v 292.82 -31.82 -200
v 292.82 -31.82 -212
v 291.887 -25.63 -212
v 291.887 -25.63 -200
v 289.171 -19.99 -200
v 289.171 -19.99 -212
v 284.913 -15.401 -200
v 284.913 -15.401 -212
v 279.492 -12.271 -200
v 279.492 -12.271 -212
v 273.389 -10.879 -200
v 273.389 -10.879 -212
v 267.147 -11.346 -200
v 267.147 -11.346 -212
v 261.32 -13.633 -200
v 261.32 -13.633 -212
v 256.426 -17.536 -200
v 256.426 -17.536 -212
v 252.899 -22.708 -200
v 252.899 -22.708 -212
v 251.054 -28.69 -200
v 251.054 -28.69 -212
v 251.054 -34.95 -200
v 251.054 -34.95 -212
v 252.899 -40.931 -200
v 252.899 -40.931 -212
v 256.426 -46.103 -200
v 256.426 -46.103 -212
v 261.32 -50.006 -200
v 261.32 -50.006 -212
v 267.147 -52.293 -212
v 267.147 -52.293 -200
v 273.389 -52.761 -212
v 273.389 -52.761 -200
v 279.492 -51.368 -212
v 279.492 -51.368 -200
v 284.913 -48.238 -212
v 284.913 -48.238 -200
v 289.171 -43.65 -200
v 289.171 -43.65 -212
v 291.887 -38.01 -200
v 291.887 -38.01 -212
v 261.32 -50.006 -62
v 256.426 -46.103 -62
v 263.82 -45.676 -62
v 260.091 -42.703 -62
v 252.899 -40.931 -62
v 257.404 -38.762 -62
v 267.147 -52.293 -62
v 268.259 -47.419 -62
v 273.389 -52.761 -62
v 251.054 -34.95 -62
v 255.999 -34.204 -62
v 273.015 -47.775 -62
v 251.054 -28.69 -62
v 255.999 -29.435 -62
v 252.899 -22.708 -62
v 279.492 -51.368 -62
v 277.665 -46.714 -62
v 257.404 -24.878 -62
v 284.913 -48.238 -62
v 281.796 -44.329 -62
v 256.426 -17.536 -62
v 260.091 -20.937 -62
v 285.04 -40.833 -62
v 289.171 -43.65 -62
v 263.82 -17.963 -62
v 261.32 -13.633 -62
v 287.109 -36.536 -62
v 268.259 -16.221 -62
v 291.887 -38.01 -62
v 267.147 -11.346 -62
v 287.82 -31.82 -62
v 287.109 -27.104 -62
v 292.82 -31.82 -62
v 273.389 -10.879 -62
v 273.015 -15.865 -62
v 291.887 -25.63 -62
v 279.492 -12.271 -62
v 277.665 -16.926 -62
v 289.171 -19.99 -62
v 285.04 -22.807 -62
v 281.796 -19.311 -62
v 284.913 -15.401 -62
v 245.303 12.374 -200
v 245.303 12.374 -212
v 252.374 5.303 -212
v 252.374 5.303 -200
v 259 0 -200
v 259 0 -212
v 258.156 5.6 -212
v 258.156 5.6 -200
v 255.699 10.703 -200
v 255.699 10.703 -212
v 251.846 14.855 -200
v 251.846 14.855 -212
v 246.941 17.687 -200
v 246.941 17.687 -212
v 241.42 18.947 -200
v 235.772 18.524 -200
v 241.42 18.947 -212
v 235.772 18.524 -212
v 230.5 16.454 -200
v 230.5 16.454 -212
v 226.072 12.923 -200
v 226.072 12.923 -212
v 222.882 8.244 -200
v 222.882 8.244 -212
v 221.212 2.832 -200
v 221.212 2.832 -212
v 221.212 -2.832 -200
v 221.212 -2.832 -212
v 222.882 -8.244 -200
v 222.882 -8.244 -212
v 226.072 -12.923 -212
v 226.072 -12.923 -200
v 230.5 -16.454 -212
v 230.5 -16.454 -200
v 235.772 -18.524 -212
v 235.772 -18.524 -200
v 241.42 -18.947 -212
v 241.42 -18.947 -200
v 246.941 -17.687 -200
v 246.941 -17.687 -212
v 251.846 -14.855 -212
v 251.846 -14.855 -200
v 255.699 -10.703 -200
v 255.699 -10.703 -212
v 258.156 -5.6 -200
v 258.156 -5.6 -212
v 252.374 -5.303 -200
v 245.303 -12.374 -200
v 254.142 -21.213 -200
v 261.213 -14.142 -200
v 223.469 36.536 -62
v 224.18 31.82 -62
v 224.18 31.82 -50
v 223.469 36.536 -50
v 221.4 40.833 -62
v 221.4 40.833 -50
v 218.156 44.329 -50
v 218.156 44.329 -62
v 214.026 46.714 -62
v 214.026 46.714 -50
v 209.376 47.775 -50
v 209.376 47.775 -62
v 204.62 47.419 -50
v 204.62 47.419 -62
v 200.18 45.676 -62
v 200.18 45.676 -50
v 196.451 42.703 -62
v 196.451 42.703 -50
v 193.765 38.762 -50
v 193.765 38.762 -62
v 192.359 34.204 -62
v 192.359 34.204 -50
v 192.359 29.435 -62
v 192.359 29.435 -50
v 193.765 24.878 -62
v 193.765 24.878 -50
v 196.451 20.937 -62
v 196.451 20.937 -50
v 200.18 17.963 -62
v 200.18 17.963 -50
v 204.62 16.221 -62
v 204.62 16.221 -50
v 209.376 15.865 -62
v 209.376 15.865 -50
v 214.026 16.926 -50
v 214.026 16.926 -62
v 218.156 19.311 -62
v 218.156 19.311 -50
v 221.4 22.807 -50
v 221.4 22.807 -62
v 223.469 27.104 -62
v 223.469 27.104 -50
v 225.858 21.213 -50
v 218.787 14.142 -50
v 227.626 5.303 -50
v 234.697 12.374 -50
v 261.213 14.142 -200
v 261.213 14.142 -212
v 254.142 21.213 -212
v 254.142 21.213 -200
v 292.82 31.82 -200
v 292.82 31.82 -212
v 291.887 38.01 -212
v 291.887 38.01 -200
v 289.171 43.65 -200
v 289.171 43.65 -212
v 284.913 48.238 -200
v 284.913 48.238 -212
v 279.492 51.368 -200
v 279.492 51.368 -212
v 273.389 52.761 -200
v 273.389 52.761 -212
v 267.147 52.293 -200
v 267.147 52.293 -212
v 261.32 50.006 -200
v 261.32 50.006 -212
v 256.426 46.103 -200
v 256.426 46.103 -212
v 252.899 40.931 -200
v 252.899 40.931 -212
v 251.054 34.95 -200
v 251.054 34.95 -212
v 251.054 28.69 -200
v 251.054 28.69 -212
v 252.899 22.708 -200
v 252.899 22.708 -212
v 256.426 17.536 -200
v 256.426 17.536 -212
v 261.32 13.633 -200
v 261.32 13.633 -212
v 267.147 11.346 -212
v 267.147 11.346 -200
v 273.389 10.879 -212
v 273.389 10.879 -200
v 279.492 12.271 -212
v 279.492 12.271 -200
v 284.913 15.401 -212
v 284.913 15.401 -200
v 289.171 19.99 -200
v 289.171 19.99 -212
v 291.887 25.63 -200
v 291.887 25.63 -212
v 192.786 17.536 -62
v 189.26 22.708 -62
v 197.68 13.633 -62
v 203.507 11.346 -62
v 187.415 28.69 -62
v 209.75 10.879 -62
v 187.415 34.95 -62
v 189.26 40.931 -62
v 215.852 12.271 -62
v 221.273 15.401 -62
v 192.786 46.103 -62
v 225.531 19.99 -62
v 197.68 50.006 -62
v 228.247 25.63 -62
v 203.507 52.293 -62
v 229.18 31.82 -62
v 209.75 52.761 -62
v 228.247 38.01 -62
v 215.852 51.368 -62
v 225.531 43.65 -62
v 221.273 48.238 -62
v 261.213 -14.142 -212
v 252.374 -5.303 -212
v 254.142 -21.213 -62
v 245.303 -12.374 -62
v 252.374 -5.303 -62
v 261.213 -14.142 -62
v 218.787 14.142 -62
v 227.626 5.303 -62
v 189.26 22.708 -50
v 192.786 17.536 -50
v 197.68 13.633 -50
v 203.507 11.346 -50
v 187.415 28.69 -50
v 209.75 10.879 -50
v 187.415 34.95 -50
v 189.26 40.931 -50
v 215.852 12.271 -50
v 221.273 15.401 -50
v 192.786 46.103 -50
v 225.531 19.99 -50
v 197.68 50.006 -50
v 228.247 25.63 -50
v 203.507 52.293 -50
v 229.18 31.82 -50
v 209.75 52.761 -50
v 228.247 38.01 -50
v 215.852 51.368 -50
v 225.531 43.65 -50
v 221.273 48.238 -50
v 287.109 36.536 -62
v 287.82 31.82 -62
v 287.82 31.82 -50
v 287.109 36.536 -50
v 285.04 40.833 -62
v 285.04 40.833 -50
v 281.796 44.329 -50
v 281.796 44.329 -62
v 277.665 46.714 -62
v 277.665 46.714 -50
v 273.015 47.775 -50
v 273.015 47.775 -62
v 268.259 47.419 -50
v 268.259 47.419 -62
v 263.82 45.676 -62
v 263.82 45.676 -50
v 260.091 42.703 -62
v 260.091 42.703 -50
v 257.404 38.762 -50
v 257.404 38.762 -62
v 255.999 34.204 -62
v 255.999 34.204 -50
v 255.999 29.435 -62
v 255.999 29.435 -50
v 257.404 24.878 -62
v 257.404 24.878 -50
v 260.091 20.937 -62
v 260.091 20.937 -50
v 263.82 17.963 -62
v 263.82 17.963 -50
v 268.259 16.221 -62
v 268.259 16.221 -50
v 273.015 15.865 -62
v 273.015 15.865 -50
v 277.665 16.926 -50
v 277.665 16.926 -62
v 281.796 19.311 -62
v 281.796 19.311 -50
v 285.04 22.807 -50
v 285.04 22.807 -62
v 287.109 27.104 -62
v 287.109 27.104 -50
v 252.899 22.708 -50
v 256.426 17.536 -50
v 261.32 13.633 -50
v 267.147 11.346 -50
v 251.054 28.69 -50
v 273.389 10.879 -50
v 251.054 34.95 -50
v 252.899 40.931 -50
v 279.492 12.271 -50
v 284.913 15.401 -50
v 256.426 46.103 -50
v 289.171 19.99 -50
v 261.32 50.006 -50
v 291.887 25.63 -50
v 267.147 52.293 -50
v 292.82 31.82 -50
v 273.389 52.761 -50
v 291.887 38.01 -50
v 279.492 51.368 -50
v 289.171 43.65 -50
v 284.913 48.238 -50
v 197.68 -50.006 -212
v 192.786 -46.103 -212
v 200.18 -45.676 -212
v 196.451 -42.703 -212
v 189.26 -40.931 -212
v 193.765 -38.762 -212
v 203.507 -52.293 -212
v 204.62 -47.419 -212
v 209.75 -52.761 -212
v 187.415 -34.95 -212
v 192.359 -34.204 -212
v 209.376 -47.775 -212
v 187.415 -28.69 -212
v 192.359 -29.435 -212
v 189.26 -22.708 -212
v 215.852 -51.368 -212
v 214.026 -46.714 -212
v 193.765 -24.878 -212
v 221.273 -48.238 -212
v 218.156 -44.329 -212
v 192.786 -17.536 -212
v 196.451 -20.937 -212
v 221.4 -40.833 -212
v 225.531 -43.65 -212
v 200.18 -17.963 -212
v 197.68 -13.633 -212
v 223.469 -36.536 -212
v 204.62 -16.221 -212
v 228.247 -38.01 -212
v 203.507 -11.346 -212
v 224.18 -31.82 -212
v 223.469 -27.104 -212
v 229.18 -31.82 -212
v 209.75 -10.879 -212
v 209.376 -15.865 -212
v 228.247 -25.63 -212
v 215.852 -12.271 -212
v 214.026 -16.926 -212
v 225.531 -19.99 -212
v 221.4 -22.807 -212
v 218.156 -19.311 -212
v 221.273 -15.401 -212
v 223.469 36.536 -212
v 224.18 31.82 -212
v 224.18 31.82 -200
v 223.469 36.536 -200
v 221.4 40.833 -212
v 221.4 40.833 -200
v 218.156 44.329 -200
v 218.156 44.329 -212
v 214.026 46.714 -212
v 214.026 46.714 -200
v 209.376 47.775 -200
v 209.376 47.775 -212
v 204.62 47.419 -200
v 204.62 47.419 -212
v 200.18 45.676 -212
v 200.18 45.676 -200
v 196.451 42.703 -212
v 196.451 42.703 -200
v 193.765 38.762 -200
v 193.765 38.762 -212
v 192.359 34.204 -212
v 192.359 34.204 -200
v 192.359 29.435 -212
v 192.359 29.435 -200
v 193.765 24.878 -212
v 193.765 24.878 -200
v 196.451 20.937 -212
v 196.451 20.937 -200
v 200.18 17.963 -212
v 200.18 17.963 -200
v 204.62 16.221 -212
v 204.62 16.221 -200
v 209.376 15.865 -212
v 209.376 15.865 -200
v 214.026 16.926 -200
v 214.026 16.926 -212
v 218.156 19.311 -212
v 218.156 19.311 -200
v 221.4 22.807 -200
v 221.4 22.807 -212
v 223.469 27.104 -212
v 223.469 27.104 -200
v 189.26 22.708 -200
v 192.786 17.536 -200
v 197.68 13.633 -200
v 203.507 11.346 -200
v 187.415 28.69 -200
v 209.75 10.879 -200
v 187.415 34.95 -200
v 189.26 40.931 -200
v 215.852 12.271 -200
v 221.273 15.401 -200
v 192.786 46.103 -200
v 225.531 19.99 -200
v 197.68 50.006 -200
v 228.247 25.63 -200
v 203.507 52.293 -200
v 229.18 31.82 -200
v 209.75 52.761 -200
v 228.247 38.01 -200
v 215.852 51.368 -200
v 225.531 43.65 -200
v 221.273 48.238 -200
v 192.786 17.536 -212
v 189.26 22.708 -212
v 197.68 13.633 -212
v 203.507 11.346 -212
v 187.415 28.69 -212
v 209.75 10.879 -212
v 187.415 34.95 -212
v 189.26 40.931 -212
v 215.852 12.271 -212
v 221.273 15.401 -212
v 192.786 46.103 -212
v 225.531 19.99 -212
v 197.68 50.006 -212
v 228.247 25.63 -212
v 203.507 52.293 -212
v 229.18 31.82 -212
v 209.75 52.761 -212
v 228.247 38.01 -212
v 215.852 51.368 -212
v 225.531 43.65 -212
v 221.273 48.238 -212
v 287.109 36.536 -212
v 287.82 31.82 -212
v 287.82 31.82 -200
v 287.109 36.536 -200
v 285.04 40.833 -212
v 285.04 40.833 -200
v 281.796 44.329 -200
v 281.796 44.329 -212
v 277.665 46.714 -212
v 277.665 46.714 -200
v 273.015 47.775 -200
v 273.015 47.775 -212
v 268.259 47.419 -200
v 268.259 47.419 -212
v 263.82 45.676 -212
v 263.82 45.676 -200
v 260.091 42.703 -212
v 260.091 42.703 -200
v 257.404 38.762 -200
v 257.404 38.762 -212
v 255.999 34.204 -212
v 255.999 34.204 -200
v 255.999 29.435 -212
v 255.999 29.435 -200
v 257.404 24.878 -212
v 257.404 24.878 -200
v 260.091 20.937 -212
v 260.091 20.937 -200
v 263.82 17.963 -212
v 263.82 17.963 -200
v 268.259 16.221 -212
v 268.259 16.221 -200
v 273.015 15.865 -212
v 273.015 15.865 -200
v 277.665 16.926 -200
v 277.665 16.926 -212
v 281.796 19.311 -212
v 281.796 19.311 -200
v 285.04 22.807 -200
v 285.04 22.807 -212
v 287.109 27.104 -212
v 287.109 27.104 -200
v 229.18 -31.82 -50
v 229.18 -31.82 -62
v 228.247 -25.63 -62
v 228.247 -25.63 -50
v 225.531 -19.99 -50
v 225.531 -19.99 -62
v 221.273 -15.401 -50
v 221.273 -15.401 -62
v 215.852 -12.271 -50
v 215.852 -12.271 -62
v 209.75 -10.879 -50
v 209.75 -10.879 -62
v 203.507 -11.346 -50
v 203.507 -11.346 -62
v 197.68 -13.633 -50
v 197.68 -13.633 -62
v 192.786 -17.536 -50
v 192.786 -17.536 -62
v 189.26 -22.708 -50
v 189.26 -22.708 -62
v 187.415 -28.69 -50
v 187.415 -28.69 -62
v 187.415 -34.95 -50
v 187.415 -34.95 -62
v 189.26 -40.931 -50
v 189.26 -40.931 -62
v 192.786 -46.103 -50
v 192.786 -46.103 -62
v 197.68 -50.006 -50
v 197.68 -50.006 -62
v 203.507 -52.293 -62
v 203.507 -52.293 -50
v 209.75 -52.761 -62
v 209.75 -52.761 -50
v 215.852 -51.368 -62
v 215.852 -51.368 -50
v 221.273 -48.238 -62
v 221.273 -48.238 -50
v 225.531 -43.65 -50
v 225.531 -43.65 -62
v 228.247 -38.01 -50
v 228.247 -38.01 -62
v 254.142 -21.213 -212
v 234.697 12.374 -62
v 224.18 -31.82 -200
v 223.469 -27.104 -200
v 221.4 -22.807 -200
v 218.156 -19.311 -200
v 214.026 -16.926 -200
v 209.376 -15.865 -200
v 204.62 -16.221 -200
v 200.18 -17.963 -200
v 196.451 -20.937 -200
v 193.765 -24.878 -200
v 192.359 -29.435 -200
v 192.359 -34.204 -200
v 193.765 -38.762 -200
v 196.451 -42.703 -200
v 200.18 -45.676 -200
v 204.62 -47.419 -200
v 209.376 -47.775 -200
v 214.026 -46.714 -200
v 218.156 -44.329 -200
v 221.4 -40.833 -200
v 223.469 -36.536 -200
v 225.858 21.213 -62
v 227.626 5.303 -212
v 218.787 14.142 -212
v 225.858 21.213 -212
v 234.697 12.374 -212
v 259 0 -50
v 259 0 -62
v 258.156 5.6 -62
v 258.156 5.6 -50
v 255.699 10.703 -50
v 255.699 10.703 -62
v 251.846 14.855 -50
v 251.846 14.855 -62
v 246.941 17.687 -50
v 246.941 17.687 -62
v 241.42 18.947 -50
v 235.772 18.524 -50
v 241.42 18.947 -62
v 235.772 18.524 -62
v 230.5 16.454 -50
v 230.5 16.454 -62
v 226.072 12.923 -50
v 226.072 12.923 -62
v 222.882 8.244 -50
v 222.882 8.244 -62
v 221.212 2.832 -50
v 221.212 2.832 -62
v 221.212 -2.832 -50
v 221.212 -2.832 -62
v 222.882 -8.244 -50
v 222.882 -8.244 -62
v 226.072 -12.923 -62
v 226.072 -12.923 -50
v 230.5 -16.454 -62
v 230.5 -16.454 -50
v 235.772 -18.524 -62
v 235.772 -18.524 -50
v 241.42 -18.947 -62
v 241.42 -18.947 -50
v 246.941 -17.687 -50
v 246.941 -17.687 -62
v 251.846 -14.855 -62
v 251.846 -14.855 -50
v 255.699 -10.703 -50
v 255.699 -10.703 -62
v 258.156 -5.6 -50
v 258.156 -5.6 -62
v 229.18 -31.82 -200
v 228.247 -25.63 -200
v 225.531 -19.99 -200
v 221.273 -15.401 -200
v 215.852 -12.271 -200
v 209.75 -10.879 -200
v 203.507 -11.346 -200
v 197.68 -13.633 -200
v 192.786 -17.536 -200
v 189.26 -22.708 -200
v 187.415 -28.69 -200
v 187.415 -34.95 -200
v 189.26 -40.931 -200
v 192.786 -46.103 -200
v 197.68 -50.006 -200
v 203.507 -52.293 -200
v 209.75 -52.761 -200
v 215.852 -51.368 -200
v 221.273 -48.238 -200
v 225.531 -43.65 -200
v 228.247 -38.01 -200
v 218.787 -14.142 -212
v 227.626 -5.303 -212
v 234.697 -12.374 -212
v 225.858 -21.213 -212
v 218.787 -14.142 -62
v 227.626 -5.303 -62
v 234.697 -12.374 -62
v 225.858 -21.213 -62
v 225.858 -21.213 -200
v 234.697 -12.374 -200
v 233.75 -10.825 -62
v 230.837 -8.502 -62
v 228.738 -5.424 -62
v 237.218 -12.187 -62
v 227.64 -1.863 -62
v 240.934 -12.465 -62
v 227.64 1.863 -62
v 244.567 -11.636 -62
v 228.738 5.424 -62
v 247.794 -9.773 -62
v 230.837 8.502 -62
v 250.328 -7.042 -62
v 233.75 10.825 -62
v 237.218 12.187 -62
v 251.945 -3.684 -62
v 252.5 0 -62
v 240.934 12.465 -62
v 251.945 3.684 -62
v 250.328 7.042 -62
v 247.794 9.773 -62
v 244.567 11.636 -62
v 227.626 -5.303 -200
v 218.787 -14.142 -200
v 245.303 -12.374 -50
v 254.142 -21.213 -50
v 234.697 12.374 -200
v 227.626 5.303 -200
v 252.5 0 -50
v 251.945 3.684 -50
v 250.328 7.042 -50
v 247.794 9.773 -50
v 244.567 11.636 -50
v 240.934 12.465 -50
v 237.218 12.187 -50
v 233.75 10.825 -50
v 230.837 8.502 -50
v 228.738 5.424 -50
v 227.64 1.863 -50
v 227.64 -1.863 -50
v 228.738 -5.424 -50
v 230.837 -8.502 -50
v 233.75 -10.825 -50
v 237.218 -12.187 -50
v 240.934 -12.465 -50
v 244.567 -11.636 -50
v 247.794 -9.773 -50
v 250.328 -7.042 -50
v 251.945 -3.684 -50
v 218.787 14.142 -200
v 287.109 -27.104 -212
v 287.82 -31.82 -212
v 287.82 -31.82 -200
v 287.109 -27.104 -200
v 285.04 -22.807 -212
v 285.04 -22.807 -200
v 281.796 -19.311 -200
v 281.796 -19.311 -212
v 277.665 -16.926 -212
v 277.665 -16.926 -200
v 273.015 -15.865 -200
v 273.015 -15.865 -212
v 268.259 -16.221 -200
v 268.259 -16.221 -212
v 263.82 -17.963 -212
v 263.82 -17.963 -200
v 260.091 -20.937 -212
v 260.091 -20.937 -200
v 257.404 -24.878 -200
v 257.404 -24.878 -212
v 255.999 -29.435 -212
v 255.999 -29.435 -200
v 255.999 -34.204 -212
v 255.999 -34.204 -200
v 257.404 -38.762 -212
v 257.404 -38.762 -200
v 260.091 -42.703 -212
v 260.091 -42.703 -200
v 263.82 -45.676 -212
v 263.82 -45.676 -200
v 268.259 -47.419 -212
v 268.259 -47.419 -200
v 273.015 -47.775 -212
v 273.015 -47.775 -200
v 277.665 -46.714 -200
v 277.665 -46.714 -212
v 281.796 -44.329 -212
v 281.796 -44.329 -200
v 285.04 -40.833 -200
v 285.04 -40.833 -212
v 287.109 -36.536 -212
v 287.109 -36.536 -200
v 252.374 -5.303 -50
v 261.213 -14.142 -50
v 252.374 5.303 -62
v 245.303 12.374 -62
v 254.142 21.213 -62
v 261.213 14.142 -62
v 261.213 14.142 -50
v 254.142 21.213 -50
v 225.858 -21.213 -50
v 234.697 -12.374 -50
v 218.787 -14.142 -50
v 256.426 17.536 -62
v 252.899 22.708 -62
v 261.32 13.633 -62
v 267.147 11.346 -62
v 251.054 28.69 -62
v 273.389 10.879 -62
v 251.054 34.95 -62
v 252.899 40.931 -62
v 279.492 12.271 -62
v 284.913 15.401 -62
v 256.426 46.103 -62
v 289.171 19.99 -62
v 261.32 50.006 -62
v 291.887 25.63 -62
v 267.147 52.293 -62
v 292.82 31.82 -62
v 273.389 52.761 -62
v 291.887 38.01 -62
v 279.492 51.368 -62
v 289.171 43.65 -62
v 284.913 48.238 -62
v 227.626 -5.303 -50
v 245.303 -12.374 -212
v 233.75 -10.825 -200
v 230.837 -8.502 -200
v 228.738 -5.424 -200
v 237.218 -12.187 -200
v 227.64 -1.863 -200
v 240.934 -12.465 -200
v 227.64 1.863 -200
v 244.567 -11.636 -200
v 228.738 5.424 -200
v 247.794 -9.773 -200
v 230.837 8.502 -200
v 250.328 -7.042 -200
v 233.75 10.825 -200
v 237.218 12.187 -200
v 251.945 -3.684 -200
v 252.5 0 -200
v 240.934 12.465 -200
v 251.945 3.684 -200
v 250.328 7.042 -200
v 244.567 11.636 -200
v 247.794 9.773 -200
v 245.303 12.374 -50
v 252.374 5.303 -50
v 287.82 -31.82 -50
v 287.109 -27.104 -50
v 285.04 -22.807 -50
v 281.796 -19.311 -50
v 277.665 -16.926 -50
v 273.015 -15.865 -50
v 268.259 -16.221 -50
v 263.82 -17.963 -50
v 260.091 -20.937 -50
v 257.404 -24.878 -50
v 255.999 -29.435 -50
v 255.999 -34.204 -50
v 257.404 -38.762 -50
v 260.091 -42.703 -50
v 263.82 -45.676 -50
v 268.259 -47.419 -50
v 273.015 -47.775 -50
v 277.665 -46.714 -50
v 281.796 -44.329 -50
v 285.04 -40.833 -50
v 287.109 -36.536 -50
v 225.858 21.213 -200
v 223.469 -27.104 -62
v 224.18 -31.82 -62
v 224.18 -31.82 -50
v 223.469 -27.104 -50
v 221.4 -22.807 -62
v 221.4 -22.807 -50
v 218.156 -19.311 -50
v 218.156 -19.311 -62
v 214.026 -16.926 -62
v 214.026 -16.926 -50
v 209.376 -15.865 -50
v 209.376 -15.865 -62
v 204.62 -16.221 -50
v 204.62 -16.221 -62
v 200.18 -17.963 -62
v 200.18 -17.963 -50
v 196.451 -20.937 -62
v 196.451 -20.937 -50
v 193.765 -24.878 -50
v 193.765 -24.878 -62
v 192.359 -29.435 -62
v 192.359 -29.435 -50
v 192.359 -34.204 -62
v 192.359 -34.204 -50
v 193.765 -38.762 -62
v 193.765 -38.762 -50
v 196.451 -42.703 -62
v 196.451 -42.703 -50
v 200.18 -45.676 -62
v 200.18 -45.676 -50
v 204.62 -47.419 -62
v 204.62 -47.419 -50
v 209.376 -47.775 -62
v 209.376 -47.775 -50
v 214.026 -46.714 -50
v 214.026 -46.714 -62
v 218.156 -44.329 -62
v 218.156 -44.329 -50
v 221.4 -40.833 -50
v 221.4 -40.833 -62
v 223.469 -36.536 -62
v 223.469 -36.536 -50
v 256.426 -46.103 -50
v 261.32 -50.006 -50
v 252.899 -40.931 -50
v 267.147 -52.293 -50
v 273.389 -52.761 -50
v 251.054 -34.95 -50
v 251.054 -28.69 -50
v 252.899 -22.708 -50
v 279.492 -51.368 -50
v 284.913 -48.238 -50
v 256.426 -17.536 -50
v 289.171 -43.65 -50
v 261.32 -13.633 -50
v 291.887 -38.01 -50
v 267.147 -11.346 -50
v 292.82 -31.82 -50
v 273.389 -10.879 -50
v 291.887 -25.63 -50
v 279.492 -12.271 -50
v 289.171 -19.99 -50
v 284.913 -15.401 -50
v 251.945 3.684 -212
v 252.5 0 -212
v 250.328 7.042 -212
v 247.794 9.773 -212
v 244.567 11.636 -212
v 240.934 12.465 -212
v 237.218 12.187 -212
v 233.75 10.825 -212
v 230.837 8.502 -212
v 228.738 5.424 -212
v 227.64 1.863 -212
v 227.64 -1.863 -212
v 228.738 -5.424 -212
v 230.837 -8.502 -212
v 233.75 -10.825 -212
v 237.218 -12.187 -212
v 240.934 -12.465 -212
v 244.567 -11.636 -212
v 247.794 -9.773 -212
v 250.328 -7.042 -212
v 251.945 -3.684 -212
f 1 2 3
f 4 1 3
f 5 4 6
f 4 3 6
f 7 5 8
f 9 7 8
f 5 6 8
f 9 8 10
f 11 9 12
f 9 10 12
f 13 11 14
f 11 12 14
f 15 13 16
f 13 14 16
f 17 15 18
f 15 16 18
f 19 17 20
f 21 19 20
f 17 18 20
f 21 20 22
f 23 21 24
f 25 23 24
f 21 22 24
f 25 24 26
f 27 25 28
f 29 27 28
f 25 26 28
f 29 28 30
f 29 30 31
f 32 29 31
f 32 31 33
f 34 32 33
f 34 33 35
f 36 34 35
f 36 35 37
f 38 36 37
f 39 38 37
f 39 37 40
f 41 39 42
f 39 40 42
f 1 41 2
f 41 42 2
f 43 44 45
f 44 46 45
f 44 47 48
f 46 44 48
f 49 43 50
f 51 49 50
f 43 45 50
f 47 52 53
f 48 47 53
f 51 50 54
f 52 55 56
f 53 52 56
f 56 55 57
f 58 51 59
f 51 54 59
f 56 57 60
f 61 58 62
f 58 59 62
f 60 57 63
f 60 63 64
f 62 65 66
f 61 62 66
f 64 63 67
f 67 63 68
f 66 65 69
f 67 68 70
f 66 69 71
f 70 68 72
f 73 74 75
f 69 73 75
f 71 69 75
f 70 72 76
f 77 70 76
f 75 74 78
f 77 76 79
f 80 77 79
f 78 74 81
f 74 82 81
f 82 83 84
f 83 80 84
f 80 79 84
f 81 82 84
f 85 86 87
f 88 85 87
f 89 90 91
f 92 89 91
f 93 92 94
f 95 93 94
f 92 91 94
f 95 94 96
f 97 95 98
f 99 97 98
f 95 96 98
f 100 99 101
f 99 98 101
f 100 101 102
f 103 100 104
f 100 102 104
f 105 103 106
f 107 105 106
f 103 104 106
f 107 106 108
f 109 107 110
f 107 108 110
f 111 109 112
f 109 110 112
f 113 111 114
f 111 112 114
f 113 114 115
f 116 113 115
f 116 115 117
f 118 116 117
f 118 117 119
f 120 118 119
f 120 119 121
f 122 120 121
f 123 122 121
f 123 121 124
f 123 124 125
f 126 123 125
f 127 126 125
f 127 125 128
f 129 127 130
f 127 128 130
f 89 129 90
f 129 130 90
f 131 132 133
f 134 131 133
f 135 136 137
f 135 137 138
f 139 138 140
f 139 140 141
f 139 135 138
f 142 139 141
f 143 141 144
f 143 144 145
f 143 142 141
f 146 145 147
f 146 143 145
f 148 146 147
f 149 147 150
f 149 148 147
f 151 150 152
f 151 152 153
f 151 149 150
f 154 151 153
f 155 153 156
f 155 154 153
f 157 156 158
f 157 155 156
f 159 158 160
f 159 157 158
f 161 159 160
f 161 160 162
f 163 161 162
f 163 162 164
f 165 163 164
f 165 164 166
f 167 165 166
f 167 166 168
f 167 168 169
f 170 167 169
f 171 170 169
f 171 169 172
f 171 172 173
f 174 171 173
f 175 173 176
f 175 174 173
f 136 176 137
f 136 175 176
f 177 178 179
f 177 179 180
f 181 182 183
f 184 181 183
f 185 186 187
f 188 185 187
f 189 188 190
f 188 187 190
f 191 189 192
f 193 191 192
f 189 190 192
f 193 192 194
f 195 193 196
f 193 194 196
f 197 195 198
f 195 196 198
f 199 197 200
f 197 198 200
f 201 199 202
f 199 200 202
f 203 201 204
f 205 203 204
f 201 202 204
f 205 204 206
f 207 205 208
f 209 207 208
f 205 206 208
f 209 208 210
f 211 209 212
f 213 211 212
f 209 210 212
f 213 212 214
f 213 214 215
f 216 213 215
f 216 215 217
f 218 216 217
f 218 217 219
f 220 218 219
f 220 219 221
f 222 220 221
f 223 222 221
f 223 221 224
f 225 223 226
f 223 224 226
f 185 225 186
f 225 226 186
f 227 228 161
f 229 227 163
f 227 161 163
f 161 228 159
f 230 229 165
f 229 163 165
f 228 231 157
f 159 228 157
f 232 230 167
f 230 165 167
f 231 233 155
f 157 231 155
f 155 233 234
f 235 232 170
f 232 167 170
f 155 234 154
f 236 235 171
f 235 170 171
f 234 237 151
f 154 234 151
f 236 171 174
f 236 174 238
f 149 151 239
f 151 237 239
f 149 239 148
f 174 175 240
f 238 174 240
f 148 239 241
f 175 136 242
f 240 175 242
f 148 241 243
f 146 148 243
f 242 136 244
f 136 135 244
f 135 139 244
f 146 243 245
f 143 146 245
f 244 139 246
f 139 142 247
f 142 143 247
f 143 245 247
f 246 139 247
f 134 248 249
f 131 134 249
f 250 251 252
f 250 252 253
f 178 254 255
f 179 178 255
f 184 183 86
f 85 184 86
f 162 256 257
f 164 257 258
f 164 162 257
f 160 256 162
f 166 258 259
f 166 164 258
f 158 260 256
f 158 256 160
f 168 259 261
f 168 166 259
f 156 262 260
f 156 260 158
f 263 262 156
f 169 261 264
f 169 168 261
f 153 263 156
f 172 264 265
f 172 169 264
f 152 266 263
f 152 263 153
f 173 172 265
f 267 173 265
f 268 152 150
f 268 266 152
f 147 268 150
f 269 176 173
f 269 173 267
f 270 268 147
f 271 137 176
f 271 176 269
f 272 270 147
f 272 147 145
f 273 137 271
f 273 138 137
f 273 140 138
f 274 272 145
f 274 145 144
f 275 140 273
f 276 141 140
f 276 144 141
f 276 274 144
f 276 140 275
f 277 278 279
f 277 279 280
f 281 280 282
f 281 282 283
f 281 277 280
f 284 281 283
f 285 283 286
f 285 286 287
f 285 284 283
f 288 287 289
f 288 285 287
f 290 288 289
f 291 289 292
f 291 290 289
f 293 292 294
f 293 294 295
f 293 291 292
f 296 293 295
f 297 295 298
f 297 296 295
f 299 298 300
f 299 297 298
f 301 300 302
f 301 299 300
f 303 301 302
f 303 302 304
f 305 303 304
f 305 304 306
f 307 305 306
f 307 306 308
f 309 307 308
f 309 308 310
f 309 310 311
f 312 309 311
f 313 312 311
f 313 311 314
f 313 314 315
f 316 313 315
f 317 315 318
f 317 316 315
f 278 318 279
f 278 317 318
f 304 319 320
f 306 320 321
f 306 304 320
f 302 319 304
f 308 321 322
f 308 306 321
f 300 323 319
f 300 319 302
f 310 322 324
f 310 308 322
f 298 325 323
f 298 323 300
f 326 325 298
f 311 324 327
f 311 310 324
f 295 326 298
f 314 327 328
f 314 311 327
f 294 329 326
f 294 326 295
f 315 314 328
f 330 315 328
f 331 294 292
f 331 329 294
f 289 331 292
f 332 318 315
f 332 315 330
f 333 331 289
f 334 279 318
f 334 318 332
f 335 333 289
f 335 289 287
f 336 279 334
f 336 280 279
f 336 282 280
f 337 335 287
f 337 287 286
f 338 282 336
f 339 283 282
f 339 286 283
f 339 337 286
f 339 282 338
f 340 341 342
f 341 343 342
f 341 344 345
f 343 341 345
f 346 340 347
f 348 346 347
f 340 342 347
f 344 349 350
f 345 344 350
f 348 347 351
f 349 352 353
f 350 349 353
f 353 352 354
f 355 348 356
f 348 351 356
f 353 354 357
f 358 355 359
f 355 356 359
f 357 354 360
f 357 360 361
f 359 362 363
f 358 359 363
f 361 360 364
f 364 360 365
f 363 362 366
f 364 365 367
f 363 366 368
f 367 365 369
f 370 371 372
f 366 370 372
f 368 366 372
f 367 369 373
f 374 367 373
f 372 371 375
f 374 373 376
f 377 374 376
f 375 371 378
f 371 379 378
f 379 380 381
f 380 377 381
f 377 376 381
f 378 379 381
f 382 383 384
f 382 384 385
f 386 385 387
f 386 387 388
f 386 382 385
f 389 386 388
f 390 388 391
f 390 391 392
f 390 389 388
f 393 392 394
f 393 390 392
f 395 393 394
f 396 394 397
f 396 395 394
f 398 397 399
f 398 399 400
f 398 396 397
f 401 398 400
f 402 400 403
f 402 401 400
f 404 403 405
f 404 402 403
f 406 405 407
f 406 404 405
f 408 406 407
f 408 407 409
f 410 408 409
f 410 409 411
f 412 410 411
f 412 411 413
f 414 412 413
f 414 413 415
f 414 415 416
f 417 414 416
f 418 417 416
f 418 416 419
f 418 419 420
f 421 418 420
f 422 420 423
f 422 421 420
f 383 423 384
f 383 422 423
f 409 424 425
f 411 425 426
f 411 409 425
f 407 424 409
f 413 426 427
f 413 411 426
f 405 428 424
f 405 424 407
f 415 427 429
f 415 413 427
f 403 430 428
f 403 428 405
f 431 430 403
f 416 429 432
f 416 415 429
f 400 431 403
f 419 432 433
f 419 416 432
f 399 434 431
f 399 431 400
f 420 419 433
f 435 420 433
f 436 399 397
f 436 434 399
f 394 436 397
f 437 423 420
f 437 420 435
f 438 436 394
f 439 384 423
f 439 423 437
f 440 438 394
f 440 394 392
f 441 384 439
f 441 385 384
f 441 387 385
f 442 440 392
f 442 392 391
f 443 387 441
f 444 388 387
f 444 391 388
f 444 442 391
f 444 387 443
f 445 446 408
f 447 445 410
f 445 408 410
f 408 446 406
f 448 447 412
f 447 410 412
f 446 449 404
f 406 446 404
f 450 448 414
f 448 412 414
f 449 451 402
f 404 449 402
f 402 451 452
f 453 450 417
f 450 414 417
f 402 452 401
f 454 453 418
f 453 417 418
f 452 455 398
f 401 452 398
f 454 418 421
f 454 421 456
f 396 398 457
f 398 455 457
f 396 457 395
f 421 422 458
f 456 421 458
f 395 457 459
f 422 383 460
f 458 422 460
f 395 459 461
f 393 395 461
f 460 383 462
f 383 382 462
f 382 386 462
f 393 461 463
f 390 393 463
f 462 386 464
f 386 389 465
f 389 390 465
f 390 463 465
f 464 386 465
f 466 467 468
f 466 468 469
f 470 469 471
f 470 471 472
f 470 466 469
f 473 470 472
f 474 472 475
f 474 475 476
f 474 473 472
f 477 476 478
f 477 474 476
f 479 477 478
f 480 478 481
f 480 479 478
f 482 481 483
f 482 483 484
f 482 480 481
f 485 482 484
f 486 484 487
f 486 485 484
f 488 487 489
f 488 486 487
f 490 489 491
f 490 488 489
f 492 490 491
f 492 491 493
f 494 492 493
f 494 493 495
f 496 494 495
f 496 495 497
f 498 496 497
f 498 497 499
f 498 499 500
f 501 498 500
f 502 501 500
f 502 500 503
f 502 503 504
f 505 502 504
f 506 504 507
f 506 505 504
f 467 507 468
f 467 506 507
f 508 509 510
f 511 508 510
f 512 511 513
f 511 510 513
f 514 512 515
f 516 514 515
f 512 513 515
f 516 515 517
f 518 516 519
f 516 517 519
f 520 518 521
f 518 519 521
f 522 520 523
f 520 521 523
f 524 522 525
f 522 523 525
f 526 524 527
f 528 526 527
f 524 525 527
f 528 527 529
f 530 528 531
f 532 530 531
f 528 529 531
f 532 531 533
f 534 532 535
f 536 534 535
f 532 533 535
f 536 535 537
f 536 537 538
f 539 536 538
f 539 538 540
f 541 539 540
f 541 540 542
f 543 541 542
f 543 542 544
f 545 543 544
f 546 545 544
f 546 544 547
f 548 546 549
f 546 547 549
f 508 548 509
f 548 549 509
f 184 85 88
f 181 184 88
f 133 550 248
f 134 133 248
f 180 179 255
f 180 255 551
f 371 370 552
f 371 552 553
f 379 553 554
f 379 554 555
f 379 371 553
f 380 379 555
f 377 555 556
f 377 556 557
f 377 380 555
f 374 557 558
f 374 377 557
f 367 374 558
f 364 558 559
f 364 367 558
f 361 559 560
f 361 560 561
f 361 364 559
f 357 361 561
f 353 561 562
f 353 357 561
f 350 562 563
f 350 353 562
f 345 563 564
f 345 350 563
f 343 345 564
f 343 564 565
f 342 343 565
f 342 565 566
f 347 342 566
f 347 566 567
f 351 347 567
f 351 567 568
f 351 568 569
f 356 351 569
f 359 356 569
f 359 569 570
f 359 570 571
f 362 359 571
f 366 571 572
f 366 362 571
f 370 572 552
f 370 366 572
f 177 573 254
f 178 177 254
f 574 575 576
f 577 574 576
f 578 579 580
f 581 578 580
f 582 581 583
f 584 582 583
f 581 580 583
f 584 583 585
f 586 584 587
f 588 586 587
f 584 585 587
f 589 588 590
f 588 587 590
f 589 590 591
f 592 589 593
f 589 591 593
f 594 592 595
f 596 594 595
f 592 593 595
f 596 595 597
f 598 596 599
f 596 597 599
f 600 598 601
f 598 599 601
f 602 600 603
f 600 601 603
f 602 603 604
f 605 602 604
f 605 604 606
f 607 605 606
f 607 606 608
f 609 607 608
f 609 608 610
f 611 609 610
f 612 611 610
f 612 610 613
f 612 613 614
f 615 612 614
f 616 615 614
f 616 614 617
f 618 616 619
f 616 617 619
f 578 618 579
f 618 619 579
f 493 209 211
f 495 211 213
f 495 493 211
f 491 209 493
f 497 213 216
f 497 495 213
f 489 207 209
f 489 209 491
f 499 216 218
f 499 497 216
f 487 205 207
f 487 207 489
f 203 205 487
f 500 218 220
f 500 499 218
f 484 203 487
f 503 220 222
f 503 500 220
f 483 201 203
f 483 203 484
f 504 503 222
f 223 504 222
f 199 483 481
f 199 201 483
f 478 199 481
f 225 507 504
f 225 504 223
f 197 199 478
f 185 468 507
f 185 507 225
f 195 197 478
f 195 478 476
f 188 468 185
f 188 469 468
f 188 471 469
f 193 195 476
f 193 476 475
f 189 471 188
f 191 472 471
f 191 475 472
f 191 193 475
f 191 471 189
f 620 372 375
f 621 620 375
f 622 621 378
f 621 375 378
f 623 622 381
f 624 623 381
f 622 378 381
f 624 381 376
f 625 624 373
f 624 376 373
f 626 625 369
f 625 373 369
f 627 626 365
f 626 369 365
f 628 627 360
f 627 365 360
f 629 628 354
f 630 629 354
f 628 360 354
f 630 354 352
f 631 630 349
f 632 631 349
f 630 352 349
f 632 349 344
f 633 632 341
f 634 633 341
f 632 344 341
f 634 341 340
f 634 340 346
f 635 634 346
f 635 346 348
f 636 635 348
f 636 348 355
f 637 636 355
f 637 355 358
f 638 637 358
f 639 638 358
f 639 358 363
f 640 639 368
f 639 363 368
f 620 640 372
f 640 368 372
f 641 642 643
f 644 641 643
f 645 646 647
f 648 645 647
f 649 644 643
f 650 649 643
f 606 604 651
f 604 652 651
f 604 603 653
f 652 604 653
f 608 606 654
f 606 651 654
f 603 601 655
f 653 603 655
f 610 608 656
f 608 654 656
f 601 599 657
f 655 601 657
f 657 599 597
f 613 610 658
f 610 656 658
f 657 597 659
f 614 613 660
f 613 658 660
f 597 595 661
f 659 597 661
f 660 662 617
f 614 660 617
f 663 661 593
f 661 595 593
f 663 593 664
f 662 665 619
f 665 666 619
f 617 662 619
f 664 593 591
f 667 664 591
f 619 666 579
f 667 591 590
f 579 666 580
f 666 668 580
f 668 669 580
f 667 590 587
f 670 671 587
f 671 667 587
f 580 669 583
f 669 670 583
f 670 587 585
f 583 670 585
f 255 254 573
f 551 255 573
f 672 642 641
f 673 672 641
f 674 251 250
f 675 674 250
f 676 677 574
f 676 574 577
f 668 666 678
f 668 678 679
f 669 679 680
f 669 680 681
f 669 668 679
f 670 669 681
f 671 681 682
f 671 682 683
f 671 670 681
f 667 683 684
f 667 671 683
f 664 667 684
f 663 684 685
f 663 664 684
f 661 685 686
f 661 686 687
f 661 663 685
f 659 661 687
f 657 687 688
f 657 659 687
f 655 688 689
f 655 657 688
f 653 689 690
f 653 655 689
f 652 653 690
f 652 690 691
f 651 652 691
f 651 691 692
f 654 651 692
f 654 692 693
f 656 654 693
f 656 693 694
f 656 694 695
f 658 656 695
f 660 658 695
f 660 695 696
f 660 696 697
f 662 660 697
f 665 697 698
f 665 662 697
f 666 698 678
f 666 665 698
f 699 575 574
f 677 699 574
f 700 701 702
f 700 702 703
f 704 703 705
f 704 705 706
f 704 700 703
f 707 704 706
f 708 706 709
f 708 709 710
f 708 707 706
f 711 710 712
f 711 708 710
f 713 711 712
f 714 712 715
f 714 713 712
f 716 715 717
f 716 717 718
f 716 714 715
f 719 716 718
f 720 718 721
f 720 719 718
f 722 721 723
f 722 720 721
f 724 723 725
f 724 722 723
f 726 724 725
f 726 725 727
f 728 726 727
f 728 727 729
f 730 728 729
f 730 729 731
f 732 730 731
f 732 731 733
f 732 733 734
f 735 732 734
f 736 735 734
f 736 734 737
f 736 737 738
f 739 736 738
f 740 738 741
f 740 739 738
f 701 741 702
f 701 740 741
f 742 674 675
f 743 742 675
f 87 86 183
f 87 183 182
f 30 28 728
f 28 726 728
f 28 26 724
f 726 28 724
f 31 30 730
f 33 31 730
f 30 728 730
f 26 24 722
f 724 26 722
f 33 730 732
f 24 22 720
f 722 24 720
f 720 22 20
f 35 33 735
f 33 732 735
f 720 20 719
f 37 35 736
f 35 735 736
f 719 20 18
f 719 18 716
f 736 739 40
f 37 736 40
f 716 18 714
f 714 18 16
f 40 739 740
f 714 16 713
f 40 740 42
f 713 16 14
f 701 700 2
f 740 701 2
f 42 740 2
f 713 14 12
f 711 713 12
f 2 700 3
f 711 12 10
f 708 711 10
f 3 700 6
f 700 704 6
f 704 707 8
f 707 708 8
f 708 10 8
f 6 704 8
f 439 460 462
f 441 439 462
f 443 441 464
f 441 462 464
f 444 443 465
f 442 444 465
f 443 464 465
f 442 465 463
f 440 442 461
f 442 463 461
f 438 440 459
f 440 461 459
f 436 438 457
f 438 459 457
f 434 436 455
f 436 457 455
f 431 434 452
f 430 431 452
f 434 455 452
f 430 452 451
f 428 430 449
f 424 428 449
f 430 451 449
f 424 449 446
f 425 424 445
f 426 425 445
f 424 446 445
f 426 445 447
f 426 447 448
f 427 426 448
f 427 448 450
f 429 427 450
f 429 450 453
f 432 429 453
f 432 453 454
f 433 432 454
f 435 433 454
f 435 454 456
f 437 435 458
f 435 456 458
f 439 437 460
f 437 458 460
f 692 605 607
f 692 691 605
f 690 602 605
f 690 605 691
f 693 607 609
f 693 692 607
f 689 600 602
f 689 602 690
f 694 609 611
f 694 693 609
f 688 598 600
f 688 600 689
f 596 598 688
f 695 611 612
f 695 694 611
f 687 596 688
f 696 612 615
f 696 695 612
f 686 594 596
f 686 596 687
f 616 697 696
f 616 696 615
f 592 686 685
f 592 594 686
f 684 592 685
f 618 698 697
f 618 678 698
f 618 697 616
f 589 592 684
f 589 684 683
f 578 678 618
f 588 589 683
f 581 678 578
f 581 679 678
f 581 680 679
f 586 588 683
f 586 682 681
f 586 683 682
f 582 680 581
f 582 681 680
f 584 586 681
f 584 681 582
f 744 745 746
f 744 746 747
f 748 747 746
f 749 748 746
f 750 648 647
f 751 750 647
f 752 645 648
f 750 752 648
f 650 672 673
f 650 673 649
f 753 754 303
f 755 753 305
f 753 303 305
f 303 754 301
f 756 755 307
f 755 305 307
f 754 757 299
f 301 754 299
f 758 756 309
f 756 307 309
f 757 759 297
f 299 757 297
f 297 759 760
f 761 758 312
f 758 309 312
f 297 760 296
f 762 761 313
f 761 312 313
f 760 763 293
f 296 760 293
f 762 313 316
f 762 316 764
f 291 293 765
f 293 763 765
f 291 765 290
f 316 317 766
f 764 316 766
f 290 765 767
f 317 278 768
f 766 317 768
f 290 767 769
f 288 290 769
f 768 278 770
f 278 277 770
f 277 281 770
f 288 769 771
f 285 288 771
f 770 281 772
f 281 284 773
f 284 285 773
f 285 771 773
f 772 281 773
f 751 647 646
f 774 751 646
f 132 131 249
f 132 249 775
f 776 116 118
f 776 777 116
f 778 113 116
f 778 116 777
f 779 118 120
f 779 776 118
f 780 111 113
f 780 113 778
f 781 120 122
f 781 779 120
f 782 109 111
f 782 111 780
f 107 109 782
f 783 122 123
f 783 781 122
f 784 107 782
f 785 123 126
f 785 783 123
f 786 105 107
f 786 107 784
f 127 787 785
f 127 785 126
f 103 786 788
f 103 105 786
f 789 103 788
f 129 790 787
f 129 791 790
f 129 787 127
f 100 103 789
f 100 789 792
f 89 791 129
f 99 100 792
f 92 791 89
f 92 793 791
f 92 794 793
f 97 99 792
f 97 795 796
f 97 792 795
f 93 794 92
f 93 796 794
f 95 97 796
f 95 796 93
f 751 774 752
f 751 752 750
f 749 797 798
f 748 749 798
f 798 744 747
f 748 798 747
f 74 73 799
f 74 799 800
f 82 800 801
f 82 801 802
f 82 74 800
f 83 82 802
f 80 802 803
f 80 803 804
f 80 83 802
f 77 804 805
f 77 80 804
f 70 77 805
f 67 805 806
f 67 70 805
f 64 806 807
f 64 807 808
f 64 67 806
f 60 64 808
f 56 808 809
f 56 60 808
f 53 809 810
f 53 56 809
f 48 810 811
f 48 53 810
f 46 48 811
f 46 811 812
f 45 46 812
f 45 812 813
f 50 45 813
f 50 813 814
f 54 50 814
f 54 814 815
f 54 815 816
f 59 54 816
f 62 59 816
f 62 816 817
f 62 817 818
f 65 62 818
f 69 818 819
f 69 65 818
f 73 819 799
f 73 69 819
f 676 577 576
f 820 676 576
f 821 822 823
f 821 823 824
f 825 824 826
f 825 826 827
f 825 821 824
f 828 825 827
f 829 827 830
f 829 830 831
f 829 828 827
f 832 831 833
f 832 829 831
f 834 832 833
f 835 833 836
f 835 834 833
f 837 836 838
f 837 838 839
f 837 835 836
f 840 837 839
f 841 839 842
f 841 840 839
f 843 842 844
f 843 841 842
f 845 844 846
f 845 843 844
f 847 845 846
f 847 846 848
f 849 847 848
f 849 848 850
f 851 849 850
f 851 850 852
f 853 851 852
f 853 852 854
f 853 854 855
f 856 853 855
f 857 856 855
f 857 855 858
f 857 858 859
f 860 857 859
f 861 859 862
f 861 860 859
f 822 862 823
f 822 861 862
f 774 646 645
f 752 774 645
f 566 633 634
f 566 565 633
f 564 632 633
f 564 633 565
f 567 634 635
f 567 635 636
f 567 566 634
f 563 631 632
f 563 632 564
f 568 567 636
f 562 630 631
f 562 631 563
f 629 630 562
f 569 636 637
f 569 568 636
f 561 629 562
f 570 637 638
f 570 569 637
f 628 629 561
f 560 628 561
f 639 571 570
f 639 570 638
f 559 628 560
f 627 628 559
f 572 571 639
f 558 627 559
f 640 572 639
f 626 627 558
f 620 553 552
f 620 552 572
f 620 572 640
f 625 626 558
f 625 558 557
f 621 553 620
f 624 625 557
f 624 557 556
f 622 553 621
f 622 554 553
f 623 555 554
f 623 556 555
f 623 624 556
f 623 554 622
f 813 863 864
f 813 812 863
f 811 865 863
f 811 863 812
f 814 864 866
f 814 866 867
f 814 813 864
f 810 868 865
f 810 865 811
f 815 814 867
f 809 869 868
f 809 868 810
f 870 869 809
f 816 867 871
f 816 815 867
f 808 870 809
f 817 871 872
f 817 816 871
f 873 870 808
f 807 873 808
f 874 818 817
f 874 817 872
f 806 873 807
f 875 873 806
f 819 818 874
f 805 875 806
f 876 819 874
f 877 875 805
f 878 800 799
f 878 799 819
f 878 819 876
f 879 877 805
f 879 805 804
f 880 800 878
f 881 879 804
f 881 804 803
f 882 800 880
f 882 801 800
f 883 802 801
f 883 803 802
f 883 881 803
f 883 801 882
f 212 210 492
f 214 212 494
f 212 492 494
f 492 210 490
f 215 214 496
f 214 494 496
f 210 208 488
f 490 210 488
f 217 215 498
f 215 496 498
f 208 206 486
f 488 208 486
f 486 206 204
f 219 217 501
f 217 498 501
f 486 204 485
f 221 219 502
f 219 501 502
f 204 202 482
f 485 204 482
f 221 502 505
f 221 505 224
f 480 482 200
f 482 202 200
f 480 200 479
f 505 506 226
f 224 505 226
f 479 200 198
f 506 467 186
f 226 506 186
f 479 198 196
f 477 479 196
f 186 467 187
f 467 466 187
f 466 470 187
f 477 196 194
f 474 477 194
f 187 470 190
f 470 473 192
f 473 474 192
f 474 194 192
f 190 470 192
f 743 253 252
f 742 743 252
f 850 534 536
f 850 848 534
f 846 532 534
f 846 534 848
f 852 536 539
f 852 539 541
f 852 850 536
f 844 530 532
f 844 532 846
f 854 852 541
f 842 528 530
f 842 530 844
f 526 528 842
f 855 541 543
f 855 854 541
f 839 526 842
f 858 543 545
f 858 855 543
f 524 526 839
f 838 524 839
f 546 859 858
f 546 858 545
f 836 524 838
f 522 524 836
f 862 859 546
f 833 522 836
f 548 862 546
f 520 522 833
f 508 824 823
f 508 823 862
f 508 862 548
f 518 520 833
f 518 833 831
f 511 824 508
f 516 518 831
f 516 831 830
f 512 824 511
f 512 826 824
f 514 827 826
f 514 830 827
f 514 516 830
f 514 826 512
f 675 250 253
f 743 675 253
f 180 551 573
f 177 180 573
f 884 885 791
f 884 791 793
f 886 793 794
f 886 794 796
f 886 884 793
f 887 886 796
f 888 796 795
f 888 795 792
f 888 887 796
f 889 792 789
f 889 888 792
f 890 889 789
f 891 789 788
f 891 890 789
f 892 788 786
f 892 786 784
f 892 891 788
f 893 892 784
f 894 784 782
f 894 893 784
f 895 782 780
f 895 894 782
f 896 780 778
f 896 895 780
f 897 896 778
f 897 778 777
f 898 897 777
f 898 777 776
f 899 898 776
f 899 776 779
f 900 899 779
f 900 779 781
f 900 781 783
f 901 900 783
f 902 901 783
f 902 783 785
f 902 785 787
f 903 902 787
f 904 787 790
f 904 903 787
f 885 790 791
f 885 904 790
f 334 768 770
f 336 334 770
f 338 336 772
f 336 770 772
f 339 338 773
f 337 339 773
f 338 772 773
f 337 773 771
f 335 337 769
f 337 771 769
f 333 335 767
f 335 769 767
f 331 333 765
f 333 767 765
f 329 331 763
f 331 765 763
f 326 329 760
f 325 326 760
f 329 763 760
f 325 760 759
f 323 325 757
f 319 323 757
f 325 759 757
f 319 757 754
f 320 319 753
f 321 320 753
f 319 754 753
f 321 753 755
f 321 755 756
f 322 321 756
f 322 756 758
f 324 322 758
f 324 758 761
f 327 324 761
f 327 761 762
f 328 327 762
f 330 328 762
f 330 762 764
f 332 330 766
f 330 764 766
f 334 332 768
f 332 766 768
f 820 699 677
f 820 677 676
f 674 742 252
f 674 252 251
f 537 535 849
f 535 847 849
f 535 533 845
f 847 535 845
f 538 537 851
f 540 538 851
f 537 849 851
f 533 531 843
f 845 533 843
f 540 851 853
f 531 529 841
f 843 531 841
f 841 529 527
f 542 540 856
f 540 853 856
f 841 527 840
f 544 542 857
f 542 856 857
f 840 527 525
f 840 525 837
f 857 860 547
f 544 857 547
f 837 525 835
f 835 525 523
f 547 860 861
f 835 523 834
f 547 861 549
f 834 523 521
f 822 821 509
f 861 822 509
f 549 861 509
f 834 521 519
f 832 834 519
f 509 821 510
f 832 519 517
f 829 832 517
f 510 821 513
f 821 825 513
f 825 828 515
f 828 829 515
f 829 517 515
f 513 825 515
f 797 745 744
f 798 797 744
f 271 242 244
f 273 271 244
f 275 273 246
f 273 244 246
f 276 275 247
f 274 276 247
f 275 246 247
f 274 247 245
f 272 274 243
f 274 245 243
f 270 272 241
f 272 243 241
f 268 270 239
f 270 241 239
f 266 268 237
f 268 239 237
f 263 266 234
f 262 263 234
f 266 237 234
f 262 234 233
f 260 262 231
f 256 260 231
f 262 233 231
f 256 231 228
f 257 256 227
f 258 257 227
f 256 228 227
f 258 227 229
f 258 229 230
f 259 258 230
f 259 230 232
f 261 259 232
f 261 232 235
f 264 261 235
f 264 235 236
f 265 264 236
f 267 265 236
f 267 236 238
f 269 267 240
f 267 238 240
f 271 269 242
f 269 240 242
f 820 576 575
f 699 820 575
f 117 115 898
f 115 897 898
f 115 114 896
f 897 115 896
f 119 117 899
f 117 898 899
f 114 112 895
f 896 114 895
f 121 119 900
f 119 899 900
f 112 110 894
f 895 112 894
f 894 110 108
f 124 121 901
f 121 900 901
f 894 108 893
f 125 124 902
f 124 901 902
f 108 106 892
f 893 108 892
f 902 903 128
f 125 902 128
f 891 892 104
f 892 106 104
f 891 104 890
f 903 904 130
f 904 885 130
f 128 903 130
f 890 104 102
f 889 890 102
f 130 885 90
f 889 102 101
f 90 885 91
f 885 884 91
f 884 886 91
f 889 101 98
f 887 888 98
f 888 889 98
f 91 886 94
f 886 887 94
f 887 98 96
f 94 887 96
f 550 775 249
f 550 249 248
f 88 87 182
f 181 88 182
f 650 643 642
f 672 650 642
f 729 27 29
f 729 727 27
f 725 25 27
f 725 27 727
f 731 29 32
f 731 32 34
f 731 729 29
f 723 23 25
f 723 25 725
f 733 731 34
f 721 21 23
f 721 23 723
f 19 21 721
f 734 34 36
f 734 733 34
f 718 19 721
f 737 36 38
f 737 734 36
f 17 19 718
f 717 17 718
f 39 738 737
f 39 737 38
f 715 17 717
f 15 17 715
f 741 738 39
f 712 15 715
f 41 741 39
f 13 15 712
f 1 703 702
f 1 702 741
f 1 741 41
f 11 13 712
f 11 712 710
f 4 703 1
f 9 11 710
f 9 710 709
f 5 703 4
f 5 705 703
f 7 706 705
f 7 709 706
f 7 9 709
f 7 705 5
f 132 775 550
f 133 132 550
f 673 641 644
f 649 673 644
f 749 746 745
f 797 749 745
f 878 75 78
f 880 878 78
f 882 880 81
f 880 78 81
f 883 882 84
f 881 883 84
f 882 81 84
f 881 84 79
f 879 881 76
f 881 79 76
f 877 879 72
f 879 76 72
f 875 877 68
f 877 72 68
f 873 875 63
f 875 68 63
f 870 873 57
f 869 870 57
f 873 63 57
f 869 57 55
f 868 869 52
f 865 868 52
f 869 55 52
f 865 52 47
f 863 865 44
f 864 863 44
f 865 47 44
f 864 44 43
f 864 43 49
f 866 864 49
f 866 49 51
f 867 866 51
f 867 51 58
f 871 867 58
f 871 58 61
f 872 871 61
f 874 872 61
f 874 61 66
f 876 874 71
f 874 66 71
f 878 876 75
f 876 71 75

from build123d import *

# Parameters (mm, degrees)
EXTRUDE_START         = -62
EXTRUDE_SKETCH_1_R    = 21
EXTRUDE_SKETCH_1_R_2  = 16
EXTRUDE_1_DEPTH       = 12
EXTRUDE_2_DEPTH       = 12
EXTRUDE_SKETCH_3_R    = 21
EXTRUDE_SKETCH_3_R_2  = 16
EXTRUDE_3_DEPTH       = 12
EXTRUDE_4_DEPTH       = 12
EXTRUDE_SKETCH_5_R    = 21
EXTRUDE_SKETCH_5_R_2  = 16
EXTRUDE_5_DEPTH       = 12
EXTRUDE_6_DEPTH       = 12
EXTRUDE_SKETCH_7_R    = 21
EXTRUDE_SKETCH_7_R_2  = 16
EXTRUDE_7_DEPTH       = 12
EXTRUDE_8_DEPTH       = 12
EXTRUDE_SKETCH_9_R    = 19
EXTRUDE_SKETCH_9_R_2  = 12.5
EXTRUDE_9_DEPTH       = 12
EXTRUDE_START_2       = -212
EXTRUDE_SKETCH_10_R   = 21
EXTRUDE_SKETCH_10_R_2 = 16
EXTRUDE_10_DEPTH      = 12
EXTRUDE_11_DEPTH      = 12
EXTRUDE_SKETCH_12_R   = 21
EXTRUDE_SKETCH_12_R_2 = 16
EXTRUDE_12_DEPTH      = 12
EXTRUDE_13_DEPTH      = 12
EXTRUDE_SKETCH_14_R   = 21
EXTRUDE_SKETCH_14_R_2 = 16
EXTRUDE_14_DEPTH      = 12
EXTRUDE_15_DEPTH      = 12
EXTRUDE_SKETCH_16_R   = 21
EXTRUDE_SKETCH_16_R_2 = 16
EXTRUDE_16_DEPTH      = 12
EXTRUDE_17_DEPTH      = 12
EXTRUDE_SKETCH_18_R   = 19
EXTRUDE_SKETCH_18_R_2 = 12.5
EXTRUDE_18_DEPTH      = 12


with BuildPart() as part:
    # Extrude sketch 1 → Extrude 1 (new body)
    with BuildSketch(Plane.XY.offset(EXTRUDE_START)):
        with Locations((271.819805153, 31.819805153)):
            Circle(EXTRUDE_SKETCH_1_R)
        with Locations((271.819805153, 31.819805153)):
            Circle(EXTRUDE_SKETCH_1_R_2, mode=Mode.SUBTRACT)
    extrude(amount=EXTRUDE_1_DEPTH)


with BuildPart() as body_2:
    # Extrude sketch 2 → Extrude 2 (new body)
    with BuildSketch(Plane.XY.offset(EXTRUDE_START)):
        Polygon((252.374368671, 5.303300859), (261.213203436, 14.142135624), (254.142135624, 21.213203436), (245.303300859, 12.374368671), align=None)
    extrude(amount=EXTRUDE_2_DEPTH)


with BuildPart() as body_3:
    # Extrude sketch 3 → Extrude 3 (new body)
    with BuildSketch(Plane.XY.offset(EXTRUDE_START)):
        with Locations((208.180194847, 31.819805153)):
            Circle(EXTRUDE_SKETCH_3_R)
        with Locations((208.180194847, 31.819805153)):
            Circle(EXTRUDE_SKETCH_3_R_2, mode=Mode.SUBTRACT)
    extrude(amount=EXTRUDE_3_DEPTH)


with BuildPart() as body_4:
    # Extrude sketch 4 → Extrude 4 (new body)
    with BuildSketch(Plane.XY.offset(EXTRUDE_START)):
        Polygon((234.696699141, 12.374368671), (225.857864376, 21.213203436), (218.786796564, 14.142135624), (227.625631329, 5.303300859), align=None)
    extrude(amount=EXTRUDE_4_DEPTH)


with BuildPart() as body_5:
    # Extrude sketch 5 → Extrude 5 (new body)
    with BuildSketch(Plane.XY.offset(EXTRUDE_START)):
        with Locations((208.180194847, -31.819805153)):
            Circle(EXTRUDE_SKETCH_5_R)
        with Locations((208.180194847, -31.819805153)):
            Circle(EXTRUDE_SKETCH_5_R_2, mode=Mode.SUBTRACT)
    extrude(amount=EXTRUDE_5_DEPTH)


with BuildPart() as body_6:
    # Extrude sketch 6 → Extrude 6 (new body)
    with BuildSketch(Plane.XY.offset(EXTRUDE_START)):
        Polygon((227.625631329, -5.303300859), (218.786796564, -14.142135624), (225.857864376, -21.213203436), (234.696699141, -12.374368671), align=None)
    extrude(amount=EXTRUDE_6_DEPTH)


with BuildPart() as body_7:
    # Extrude sketch 7 → Extrude 7 (new body)
    with BuildSketch(Plane.XY.offset(EXTRUDE_START)):
        with Locations((271.819805153, -31.819805153)):
            Circle(EXTRUDE_SKETCH_7_R)
        with Locations((271.819805153, -31.819805153)):
            Circle(EXTRUDE_SKETCH_7_R_2, mode=Mode.SUBTRACT)
    extrude(amount=EXTRUDE_7_DEPTH)


with BuildPart() as body_8:
    # Extrude sketch 8 → Extrude 8 (new body)
    with BuildSketch(Plane.XY.offset(EXTRUDE_START)):
        Polygon((245.303300859, -12.374368671), (254.142135624, -21.213203436), (261.213203436, -14.142135624), (252.374368671, -5.303300859), align=None)
    extrude(amount=EXTRUDE_8_DEPTH)


with BuildPart() as body_9:
    # Extrude sketch 9 → Extrude 9 (new body)
    with BuildSketch(Plane.XY.offset(EXTRUDE_START)):
        with Locations((240, 0)):
            Circle(EXTRUDE_SKETCH_9_R)
        with Locations((240, 0)):
            Circle(EXTRUDE_SKETCH_9_R_2, mode=Mode.SUBTRACT)
    extrude(amount=EXTRUDE_9_DEPTH)


with BuildPart() as body_10:
    # Extrude sketch 10 → Extrude 10 (new body)
    with BuildSketch(Plane.XY.offset(EXTRUDE_START_2)):
        with Locations((271.819805153, 31.819805153)):
            Circle(EXTRUDE_SKETCH_10_R)
        with Locations((271.819805153, 31.819805153)):
            Circle(EXTRUDE_SKETCH_10_R_2, mode=Mode.SUBTRACT)
    extrude(amount=EXTRUDE_10_DEPTH)


with BuildPart() as body_11:
    # Extrude sketch 11 → Extrude 11 (new body)
    with BuildSketch(Plane.XY.offset(EXTRUDE_START_2)):
        Polygon((252.374368671, 5.303300859), (261.213203436, 14.142135624), (254.142135624, 21.213203436), (245.303300859, 12.374368671), align=None)
    extrude(amount=EXTRUDE_11_DEPTH)


with BuildPart() as body_12:
    # Extrude sketch 12 → Extrude 12 (new body)
    with BuildSketch(Plane.XY.offset(EXTRUDE_START_2)):
        with Locations((208.180194847, 31.819805153)):
            Circle(EXTRUDE_SKETCH_12_R)
        with Locations((208.180194847, 31.819805153)):
            Circle(EXTRUDE_SKETCH_12_R_2, mode=Mode.SUBTRACT)
    extrude(amount=EXTRUDE_12_DEPTH)


with BuildPart() as body_13:
    # Extrude sketch 13 → Extrude 13 (new body)
    with BuildSketch(Plane.XY.offset(EXTRUDE_START_2)):
        Polygon((234.696699141, 12.374368671), (225.857864376, 21.213203436), (218.786796564, 14.142135624), (227.625631329, 5.303300859), align=None)
    extrude(amount=EXTRUDE_13_DEPTH)


with BuildPart() as body_14:
    # Extrude sketch 14 → Extrude 14 (new body)
    with BuildSketch(Plane.XY.offset(EXTRUDE_START_2)):
        with Locations((208.180194847, -31.819805153)):
            Circle(EXTRUDE_SKETCH_14_R)
        with Locations((208.180194847, -31.819805153)):
            Circle(EXTRUDE_SKETCH_14_R_2, mode=Mode.SUBTRACT)
    extrude(amount=EXTRUDE_14_DEPTH)


with BuildPart() as body_15:
    # Extrude sketch 15 → Extrude 15 (new body)
    with BuildSketch(Plane.XY.offset(EXTRUDE_START_2)):
        Polygon((227.625631329, -5.303300859), (218.786796564, -14.142135624), (225.857864376, -21.213203436), (234.696699141, -12.374368671), align=None)
    extrude(amount=EXTRUDE_15_DEPTH)


with BuildPart() as body_16:
    # Extrude sketch 16 → Extrude 16 (new body)
    with BuildSketch(Plane.XY.offset(EXTRUDE_START_2)):
        with Locations((271.819805153, -31.819805153)):
            Circle(EXTRUDE_SKETCH_16_R)
        with Locations((271.819805153, -31.819805153)):
            Circle(EXTRUDE_SKETCH_16_R_2, mode=Mode.SUBTRACT)
    extrude(amount=EXTRUDE_16_DEPTH)


with BuildPart() as body_17:
    # Extrude sketch 17 → Extrude 17 (new body)
    with BuildSketch(Plane.XY.offset(EXTRUDE_START_2)):
        Polygon((245.303300859, -12.374368671), (254.142135624, -21.213203436), (261.213203436, -14.142135624), (252.374368671, -5.303300859), align=None)
    extrude(amount=EXTRUDE_17_DEPTH)


with BuildPart() as body_18:
    # Extrude sketch 18 → Extrude 18 (new body)
    with BuildSketch(Plane.XY.offset(EXTRUDE_START_2)):
        with Locations((240, 0)):
            Circle(EXTRUDE_SKETCH_18_R)
        with Locations((240, 0)):
            Circle(EXTRUDE_SKETCH_18_R_2, mode=Mode.SUBTRACT)
    extrude(amount=EXTRUDE_18_DEPTH)


solid = Compound([part.part, body_2.part, body_3.part, body_4.part, body_5.part, body_6.part, body_7.part, body_8.part, body_9.part, body_10.part, body_11.part, body_12.part, body_13.part, body_14.part, body_15.part, body_16.part, body_17.part, body_18.part])
